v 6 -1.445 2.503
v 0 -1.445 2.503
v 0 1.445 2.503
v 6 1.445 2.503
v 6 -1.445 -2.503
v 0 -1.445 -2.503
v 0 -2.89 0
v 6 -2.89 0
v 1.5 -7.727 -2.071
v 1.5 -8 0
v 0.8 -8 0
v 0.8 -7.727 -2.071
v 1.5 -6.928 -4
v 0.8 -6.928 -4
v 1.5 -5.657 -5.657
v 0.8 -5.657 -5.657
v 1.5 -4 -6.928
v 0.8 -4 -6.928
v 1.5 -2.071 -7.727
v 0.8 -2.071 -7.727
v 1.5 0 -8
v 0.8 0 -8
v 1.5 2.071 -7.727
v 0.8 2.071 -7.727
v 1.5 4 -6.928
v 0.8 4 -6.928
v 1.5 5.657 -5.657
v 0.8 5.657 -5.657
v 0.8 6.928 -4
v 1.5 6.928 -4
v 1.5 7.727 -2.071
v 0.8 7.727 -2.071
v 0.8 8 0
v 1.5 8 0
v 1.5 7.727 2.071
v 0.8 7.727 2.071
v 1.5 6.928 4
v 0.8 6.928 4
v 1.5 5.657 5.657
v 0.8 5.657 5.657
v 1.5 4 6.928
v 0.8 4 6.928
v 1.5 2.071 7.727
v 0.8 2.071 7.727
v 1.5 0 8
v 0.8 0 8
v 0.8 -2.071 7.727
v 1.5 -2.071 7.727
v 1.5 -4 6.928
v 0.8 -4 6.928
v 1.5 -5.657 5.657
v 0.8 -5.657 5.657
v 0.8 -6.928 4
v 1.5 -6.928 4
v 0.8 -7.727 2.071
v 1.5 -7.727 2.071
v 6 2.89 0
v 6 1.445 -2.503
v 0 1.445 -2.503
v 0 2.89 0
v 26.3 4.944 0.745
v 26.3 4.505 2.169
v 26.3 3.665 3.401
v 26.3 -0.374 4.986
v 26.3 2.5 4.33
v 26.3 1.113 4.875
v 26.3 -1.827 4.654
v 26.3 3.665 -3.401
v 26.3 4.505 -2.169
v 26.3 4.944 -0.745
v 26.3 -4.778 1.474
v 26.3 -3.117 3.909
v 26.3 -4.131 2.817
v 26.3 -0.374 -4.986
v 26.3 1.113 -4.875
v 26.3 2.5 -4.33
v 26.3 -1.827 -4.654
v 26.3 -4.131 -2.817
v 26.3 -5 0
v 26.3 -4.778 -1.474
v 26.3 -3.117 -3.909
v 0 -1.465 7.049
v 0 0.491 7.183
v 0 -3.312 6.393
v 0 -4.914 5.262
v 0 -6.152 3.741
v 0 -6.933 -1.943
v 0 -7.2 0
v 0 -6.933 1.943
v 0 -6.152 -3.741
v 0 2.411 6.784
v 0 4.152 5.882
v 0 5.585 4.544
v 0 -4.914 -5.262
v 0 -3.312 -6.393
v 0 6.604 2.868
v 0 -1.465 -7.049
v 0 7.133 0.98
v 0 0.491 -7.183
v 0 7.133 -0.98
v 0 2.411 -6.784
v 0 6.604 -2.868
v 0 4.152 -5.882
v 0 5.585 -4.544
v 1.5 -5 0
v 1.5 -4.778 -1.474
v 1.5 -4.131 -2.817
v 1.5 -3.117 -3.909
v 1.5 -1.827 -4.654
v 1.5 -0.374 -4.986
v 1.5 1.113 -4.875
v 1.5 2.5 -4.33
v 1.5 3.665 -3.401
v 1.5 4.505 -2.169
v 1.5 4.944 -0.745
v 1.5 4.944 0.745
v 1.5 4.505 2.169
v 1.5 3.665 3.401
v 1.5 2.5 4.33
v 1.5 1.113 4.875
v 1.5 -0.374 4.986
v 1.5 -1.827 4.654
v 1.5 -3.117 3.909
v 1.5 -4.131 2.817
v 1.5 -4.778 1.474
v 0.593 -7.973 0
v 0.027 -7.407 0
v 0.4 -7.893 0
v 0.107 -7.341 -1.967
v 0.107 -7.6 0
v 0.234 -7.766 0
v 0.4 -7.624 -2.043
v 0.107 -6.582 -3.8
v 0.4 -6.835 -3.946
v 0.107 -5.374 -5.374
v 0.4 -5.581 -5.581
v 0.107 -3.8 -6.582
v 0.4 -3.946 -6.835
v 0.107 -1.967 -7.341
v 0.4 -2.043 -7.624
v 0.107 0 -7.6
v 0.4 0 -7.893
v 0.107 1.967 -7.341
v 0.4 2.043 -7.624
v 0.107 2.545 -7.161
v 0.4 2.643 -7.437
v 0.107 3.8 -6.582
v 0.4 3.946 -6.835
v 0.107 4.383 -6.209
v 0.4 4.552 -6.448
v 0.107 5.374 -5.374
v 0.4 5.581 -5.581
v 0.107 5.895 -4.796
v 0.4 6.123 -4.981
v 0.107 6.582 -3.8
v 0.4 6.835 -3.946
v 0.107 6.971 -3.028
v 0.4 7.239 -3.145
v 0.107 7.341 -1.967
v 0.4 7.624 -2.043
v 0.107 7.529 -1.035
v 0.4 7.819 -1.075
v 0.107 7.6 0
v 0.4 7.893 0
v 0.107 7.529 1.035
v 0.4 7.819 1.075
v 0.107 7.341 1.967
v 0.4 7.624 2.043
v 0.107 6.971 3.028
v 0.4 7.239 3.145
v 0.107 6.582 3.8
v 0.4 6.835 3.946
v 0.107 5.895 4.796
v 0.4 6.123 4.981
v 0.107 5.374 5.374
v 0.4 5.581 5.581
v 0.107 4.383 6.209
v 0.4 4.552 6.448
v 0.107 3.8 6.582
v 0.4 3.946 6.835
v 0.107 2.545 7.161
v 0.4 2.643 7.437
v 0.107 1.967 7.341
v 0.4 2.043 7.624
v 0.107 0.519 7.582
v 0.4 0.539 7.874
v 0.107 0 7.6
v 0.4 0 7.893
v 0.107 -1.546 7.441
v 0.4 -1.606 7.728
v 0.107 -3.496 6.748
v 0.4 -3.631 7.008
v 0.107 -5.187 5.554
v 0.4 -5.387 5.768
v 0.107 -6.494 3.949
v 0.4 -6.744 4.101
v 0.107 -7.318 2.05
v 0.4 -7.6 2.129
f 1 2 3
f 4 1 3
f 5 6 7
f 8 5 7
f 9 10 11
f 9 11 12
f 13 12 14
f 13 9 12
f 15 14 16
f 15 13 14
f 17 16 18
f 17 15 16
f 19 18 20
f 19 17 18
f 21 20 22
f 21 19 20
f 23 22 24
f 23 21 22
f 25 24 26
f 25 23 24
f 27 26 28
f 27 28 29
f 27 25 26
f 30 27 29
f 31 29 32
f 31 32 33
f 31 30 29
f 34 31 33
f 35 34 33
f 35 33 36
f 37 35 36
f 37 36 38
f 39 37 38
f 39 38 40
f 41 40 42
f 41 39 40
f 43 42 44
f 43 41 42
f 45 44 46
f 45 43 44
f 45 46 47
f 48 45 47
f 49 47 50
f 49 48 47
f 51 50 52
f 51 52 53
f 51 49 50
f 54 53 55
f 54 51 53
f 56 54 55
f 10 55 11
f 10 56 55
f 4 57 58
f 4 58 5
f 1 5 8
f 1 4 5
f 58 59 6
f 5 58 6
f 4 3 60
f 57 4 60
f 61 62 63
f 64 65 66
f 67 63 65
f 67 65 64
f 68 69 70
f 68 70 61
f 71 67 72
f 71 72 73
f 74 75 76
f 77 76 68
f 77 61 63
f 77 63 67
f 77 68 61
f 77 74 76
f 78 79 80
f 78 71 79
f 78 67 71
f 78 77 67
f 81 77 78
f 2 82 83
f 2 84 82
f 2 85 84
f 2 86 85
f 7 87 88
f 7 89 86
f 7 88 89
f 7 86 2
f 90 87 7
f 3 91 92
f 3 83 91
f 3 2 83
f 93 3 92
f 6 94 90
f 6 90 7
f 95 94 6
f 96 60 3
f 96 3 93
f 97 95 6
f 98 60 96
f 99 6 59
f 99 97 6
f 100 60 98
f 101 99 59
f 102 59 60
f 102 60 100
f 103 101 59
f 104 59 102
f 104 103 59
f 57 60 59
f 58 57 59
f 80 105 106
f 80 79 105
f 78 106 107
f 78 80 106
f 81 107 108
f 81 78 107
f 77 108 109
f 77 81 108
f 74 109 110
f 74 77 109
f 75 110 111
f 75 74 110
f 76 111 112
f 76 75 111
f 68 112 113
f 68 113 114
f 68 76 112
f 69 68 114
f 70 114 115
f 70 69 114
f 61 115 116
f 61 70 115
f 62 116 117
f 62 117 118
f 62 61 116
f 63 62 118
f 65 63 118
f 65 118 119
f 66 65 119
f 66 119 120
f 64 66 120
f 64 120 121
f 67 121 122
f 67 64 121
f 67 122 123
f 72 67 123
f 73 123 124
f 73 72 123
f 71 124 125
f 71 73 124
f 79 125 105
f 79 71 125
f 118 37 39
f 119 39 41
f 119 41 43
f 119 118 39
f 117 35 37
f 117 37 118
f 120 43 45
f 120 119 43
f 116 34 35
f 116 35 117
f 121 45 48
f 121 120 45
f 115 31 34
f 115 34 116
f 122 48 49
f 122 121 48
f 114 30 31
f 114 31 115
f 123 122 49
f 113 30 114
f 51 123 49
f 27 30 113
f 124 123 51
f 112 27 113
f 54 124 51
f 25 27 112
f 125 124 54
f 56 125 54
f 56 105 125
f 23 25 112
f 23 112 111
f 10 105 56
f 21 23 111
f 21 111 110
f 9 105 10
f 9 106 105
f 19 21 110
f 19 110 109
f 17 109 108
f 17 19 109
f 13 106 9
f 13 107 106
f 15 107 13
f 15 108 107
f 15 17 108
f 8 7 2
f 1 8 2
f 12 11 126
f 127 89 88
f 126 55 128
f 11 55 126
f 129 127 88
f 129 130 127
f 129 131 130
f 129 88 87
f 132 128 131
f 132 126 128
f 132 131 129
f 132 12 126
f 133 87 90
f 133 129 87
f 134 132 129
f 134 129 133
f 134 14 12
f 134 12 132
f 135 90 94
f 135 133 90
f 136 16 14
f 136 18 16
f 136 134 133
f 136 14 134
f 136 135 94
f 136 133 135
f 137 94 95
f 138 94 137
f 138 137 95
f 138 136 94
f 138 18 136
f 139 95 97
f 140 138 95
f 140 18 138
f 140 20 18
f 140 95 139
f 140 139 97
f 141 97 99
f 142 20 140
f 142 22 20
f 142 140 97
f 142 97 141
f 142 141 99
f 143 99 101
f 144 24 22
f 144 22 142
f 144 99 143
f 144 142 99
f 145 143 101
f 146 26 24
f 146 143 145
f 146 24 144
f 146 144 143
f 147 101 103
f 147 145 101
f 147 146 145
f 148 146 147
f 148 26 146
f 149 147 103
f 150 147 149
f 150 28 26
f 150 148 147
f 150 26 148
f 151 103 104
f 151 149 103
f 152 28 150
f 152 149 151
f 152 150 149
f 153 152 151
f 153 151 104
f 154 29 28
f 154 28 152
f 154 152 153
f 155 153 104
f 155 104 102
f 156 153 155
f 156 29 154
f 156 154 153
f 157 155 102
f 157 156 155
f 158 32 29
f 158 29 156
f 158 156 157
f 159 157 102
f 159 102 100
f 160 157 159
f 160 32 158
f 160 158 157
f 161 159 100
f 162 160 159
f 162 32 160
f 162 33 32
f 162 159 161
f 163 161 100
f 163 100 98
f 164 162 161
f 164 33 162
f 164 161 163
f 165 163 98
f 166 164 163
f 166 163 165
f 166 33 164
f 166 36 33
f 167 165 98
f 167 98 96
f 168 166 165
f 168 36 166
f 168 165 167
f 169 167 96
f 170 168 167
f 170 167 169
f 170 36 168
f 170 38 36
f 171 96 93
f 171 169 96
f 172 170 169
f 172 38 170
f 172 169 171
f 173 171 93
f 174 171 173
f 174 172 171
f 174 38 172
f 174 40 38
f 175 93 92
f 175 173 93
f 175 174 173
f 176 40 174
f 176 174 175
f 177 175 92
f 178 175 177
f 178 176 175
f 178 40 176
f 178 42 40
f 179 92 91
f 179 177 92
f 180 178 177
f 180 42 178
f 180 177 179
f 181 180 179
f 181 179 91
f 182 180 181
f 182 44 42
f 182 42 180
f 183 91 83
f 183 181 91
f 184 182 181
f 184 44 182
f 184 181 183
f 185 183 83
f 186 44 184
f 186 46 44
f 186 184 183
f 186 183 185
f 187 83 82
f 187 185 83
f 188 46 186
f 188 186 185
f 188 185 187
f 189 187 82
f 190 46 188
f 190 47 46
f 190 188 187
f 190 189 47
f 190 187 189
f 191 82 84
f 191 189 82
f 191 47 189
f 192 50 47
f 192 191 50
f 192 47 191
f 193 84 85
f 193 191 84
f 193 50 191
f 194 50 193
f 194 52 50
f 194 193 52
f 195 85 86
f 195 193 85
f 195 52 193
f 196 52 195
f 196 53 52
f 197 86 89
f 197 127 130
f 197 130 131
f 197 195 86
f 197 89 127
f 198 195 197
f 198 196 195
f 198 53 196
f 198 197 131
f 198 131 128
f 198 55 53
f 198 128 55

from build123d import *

# Parameters (mm, degrees)
F2_R     = 0.8
F4_DEPTH = 6


with BuildPart() as f1:
    # F0 (on Top) → F1 (revolve)
    with BuildSketch(Plane.XY):
        Polygon((26.3, 0), (0, 0), (0, -8), (1.5, -8), (1.5, -5), (26.3, -5), align=None)
    revolve(axis=Axis((13.15, 0, 0), (1, 0, 0)))

    # F2
    f2_edges = [f1.edges().sort_by_distance(p)[0] for p in [
        (0, 8, 0),
    ]]
    fillet(f2_edges, radius=F2_R)

    # F3 (on face) → F4 (cut)
    with BuildSketch(Plane(origin=(0, 0, 0), x_dir=(0, -1, 0), z_dir=(-1, 0, 0))):
        Polygon((1.445, 2.502813), (-1.445, 2.502813), (-2.89, 0), (-1.445, -2.502813), (1.445, -2.502813), (2.89, 0), align=None)
    extrude(amount=-F4_DEPTH, mode=Mode.SUBTRACT)


solid = f1.part
